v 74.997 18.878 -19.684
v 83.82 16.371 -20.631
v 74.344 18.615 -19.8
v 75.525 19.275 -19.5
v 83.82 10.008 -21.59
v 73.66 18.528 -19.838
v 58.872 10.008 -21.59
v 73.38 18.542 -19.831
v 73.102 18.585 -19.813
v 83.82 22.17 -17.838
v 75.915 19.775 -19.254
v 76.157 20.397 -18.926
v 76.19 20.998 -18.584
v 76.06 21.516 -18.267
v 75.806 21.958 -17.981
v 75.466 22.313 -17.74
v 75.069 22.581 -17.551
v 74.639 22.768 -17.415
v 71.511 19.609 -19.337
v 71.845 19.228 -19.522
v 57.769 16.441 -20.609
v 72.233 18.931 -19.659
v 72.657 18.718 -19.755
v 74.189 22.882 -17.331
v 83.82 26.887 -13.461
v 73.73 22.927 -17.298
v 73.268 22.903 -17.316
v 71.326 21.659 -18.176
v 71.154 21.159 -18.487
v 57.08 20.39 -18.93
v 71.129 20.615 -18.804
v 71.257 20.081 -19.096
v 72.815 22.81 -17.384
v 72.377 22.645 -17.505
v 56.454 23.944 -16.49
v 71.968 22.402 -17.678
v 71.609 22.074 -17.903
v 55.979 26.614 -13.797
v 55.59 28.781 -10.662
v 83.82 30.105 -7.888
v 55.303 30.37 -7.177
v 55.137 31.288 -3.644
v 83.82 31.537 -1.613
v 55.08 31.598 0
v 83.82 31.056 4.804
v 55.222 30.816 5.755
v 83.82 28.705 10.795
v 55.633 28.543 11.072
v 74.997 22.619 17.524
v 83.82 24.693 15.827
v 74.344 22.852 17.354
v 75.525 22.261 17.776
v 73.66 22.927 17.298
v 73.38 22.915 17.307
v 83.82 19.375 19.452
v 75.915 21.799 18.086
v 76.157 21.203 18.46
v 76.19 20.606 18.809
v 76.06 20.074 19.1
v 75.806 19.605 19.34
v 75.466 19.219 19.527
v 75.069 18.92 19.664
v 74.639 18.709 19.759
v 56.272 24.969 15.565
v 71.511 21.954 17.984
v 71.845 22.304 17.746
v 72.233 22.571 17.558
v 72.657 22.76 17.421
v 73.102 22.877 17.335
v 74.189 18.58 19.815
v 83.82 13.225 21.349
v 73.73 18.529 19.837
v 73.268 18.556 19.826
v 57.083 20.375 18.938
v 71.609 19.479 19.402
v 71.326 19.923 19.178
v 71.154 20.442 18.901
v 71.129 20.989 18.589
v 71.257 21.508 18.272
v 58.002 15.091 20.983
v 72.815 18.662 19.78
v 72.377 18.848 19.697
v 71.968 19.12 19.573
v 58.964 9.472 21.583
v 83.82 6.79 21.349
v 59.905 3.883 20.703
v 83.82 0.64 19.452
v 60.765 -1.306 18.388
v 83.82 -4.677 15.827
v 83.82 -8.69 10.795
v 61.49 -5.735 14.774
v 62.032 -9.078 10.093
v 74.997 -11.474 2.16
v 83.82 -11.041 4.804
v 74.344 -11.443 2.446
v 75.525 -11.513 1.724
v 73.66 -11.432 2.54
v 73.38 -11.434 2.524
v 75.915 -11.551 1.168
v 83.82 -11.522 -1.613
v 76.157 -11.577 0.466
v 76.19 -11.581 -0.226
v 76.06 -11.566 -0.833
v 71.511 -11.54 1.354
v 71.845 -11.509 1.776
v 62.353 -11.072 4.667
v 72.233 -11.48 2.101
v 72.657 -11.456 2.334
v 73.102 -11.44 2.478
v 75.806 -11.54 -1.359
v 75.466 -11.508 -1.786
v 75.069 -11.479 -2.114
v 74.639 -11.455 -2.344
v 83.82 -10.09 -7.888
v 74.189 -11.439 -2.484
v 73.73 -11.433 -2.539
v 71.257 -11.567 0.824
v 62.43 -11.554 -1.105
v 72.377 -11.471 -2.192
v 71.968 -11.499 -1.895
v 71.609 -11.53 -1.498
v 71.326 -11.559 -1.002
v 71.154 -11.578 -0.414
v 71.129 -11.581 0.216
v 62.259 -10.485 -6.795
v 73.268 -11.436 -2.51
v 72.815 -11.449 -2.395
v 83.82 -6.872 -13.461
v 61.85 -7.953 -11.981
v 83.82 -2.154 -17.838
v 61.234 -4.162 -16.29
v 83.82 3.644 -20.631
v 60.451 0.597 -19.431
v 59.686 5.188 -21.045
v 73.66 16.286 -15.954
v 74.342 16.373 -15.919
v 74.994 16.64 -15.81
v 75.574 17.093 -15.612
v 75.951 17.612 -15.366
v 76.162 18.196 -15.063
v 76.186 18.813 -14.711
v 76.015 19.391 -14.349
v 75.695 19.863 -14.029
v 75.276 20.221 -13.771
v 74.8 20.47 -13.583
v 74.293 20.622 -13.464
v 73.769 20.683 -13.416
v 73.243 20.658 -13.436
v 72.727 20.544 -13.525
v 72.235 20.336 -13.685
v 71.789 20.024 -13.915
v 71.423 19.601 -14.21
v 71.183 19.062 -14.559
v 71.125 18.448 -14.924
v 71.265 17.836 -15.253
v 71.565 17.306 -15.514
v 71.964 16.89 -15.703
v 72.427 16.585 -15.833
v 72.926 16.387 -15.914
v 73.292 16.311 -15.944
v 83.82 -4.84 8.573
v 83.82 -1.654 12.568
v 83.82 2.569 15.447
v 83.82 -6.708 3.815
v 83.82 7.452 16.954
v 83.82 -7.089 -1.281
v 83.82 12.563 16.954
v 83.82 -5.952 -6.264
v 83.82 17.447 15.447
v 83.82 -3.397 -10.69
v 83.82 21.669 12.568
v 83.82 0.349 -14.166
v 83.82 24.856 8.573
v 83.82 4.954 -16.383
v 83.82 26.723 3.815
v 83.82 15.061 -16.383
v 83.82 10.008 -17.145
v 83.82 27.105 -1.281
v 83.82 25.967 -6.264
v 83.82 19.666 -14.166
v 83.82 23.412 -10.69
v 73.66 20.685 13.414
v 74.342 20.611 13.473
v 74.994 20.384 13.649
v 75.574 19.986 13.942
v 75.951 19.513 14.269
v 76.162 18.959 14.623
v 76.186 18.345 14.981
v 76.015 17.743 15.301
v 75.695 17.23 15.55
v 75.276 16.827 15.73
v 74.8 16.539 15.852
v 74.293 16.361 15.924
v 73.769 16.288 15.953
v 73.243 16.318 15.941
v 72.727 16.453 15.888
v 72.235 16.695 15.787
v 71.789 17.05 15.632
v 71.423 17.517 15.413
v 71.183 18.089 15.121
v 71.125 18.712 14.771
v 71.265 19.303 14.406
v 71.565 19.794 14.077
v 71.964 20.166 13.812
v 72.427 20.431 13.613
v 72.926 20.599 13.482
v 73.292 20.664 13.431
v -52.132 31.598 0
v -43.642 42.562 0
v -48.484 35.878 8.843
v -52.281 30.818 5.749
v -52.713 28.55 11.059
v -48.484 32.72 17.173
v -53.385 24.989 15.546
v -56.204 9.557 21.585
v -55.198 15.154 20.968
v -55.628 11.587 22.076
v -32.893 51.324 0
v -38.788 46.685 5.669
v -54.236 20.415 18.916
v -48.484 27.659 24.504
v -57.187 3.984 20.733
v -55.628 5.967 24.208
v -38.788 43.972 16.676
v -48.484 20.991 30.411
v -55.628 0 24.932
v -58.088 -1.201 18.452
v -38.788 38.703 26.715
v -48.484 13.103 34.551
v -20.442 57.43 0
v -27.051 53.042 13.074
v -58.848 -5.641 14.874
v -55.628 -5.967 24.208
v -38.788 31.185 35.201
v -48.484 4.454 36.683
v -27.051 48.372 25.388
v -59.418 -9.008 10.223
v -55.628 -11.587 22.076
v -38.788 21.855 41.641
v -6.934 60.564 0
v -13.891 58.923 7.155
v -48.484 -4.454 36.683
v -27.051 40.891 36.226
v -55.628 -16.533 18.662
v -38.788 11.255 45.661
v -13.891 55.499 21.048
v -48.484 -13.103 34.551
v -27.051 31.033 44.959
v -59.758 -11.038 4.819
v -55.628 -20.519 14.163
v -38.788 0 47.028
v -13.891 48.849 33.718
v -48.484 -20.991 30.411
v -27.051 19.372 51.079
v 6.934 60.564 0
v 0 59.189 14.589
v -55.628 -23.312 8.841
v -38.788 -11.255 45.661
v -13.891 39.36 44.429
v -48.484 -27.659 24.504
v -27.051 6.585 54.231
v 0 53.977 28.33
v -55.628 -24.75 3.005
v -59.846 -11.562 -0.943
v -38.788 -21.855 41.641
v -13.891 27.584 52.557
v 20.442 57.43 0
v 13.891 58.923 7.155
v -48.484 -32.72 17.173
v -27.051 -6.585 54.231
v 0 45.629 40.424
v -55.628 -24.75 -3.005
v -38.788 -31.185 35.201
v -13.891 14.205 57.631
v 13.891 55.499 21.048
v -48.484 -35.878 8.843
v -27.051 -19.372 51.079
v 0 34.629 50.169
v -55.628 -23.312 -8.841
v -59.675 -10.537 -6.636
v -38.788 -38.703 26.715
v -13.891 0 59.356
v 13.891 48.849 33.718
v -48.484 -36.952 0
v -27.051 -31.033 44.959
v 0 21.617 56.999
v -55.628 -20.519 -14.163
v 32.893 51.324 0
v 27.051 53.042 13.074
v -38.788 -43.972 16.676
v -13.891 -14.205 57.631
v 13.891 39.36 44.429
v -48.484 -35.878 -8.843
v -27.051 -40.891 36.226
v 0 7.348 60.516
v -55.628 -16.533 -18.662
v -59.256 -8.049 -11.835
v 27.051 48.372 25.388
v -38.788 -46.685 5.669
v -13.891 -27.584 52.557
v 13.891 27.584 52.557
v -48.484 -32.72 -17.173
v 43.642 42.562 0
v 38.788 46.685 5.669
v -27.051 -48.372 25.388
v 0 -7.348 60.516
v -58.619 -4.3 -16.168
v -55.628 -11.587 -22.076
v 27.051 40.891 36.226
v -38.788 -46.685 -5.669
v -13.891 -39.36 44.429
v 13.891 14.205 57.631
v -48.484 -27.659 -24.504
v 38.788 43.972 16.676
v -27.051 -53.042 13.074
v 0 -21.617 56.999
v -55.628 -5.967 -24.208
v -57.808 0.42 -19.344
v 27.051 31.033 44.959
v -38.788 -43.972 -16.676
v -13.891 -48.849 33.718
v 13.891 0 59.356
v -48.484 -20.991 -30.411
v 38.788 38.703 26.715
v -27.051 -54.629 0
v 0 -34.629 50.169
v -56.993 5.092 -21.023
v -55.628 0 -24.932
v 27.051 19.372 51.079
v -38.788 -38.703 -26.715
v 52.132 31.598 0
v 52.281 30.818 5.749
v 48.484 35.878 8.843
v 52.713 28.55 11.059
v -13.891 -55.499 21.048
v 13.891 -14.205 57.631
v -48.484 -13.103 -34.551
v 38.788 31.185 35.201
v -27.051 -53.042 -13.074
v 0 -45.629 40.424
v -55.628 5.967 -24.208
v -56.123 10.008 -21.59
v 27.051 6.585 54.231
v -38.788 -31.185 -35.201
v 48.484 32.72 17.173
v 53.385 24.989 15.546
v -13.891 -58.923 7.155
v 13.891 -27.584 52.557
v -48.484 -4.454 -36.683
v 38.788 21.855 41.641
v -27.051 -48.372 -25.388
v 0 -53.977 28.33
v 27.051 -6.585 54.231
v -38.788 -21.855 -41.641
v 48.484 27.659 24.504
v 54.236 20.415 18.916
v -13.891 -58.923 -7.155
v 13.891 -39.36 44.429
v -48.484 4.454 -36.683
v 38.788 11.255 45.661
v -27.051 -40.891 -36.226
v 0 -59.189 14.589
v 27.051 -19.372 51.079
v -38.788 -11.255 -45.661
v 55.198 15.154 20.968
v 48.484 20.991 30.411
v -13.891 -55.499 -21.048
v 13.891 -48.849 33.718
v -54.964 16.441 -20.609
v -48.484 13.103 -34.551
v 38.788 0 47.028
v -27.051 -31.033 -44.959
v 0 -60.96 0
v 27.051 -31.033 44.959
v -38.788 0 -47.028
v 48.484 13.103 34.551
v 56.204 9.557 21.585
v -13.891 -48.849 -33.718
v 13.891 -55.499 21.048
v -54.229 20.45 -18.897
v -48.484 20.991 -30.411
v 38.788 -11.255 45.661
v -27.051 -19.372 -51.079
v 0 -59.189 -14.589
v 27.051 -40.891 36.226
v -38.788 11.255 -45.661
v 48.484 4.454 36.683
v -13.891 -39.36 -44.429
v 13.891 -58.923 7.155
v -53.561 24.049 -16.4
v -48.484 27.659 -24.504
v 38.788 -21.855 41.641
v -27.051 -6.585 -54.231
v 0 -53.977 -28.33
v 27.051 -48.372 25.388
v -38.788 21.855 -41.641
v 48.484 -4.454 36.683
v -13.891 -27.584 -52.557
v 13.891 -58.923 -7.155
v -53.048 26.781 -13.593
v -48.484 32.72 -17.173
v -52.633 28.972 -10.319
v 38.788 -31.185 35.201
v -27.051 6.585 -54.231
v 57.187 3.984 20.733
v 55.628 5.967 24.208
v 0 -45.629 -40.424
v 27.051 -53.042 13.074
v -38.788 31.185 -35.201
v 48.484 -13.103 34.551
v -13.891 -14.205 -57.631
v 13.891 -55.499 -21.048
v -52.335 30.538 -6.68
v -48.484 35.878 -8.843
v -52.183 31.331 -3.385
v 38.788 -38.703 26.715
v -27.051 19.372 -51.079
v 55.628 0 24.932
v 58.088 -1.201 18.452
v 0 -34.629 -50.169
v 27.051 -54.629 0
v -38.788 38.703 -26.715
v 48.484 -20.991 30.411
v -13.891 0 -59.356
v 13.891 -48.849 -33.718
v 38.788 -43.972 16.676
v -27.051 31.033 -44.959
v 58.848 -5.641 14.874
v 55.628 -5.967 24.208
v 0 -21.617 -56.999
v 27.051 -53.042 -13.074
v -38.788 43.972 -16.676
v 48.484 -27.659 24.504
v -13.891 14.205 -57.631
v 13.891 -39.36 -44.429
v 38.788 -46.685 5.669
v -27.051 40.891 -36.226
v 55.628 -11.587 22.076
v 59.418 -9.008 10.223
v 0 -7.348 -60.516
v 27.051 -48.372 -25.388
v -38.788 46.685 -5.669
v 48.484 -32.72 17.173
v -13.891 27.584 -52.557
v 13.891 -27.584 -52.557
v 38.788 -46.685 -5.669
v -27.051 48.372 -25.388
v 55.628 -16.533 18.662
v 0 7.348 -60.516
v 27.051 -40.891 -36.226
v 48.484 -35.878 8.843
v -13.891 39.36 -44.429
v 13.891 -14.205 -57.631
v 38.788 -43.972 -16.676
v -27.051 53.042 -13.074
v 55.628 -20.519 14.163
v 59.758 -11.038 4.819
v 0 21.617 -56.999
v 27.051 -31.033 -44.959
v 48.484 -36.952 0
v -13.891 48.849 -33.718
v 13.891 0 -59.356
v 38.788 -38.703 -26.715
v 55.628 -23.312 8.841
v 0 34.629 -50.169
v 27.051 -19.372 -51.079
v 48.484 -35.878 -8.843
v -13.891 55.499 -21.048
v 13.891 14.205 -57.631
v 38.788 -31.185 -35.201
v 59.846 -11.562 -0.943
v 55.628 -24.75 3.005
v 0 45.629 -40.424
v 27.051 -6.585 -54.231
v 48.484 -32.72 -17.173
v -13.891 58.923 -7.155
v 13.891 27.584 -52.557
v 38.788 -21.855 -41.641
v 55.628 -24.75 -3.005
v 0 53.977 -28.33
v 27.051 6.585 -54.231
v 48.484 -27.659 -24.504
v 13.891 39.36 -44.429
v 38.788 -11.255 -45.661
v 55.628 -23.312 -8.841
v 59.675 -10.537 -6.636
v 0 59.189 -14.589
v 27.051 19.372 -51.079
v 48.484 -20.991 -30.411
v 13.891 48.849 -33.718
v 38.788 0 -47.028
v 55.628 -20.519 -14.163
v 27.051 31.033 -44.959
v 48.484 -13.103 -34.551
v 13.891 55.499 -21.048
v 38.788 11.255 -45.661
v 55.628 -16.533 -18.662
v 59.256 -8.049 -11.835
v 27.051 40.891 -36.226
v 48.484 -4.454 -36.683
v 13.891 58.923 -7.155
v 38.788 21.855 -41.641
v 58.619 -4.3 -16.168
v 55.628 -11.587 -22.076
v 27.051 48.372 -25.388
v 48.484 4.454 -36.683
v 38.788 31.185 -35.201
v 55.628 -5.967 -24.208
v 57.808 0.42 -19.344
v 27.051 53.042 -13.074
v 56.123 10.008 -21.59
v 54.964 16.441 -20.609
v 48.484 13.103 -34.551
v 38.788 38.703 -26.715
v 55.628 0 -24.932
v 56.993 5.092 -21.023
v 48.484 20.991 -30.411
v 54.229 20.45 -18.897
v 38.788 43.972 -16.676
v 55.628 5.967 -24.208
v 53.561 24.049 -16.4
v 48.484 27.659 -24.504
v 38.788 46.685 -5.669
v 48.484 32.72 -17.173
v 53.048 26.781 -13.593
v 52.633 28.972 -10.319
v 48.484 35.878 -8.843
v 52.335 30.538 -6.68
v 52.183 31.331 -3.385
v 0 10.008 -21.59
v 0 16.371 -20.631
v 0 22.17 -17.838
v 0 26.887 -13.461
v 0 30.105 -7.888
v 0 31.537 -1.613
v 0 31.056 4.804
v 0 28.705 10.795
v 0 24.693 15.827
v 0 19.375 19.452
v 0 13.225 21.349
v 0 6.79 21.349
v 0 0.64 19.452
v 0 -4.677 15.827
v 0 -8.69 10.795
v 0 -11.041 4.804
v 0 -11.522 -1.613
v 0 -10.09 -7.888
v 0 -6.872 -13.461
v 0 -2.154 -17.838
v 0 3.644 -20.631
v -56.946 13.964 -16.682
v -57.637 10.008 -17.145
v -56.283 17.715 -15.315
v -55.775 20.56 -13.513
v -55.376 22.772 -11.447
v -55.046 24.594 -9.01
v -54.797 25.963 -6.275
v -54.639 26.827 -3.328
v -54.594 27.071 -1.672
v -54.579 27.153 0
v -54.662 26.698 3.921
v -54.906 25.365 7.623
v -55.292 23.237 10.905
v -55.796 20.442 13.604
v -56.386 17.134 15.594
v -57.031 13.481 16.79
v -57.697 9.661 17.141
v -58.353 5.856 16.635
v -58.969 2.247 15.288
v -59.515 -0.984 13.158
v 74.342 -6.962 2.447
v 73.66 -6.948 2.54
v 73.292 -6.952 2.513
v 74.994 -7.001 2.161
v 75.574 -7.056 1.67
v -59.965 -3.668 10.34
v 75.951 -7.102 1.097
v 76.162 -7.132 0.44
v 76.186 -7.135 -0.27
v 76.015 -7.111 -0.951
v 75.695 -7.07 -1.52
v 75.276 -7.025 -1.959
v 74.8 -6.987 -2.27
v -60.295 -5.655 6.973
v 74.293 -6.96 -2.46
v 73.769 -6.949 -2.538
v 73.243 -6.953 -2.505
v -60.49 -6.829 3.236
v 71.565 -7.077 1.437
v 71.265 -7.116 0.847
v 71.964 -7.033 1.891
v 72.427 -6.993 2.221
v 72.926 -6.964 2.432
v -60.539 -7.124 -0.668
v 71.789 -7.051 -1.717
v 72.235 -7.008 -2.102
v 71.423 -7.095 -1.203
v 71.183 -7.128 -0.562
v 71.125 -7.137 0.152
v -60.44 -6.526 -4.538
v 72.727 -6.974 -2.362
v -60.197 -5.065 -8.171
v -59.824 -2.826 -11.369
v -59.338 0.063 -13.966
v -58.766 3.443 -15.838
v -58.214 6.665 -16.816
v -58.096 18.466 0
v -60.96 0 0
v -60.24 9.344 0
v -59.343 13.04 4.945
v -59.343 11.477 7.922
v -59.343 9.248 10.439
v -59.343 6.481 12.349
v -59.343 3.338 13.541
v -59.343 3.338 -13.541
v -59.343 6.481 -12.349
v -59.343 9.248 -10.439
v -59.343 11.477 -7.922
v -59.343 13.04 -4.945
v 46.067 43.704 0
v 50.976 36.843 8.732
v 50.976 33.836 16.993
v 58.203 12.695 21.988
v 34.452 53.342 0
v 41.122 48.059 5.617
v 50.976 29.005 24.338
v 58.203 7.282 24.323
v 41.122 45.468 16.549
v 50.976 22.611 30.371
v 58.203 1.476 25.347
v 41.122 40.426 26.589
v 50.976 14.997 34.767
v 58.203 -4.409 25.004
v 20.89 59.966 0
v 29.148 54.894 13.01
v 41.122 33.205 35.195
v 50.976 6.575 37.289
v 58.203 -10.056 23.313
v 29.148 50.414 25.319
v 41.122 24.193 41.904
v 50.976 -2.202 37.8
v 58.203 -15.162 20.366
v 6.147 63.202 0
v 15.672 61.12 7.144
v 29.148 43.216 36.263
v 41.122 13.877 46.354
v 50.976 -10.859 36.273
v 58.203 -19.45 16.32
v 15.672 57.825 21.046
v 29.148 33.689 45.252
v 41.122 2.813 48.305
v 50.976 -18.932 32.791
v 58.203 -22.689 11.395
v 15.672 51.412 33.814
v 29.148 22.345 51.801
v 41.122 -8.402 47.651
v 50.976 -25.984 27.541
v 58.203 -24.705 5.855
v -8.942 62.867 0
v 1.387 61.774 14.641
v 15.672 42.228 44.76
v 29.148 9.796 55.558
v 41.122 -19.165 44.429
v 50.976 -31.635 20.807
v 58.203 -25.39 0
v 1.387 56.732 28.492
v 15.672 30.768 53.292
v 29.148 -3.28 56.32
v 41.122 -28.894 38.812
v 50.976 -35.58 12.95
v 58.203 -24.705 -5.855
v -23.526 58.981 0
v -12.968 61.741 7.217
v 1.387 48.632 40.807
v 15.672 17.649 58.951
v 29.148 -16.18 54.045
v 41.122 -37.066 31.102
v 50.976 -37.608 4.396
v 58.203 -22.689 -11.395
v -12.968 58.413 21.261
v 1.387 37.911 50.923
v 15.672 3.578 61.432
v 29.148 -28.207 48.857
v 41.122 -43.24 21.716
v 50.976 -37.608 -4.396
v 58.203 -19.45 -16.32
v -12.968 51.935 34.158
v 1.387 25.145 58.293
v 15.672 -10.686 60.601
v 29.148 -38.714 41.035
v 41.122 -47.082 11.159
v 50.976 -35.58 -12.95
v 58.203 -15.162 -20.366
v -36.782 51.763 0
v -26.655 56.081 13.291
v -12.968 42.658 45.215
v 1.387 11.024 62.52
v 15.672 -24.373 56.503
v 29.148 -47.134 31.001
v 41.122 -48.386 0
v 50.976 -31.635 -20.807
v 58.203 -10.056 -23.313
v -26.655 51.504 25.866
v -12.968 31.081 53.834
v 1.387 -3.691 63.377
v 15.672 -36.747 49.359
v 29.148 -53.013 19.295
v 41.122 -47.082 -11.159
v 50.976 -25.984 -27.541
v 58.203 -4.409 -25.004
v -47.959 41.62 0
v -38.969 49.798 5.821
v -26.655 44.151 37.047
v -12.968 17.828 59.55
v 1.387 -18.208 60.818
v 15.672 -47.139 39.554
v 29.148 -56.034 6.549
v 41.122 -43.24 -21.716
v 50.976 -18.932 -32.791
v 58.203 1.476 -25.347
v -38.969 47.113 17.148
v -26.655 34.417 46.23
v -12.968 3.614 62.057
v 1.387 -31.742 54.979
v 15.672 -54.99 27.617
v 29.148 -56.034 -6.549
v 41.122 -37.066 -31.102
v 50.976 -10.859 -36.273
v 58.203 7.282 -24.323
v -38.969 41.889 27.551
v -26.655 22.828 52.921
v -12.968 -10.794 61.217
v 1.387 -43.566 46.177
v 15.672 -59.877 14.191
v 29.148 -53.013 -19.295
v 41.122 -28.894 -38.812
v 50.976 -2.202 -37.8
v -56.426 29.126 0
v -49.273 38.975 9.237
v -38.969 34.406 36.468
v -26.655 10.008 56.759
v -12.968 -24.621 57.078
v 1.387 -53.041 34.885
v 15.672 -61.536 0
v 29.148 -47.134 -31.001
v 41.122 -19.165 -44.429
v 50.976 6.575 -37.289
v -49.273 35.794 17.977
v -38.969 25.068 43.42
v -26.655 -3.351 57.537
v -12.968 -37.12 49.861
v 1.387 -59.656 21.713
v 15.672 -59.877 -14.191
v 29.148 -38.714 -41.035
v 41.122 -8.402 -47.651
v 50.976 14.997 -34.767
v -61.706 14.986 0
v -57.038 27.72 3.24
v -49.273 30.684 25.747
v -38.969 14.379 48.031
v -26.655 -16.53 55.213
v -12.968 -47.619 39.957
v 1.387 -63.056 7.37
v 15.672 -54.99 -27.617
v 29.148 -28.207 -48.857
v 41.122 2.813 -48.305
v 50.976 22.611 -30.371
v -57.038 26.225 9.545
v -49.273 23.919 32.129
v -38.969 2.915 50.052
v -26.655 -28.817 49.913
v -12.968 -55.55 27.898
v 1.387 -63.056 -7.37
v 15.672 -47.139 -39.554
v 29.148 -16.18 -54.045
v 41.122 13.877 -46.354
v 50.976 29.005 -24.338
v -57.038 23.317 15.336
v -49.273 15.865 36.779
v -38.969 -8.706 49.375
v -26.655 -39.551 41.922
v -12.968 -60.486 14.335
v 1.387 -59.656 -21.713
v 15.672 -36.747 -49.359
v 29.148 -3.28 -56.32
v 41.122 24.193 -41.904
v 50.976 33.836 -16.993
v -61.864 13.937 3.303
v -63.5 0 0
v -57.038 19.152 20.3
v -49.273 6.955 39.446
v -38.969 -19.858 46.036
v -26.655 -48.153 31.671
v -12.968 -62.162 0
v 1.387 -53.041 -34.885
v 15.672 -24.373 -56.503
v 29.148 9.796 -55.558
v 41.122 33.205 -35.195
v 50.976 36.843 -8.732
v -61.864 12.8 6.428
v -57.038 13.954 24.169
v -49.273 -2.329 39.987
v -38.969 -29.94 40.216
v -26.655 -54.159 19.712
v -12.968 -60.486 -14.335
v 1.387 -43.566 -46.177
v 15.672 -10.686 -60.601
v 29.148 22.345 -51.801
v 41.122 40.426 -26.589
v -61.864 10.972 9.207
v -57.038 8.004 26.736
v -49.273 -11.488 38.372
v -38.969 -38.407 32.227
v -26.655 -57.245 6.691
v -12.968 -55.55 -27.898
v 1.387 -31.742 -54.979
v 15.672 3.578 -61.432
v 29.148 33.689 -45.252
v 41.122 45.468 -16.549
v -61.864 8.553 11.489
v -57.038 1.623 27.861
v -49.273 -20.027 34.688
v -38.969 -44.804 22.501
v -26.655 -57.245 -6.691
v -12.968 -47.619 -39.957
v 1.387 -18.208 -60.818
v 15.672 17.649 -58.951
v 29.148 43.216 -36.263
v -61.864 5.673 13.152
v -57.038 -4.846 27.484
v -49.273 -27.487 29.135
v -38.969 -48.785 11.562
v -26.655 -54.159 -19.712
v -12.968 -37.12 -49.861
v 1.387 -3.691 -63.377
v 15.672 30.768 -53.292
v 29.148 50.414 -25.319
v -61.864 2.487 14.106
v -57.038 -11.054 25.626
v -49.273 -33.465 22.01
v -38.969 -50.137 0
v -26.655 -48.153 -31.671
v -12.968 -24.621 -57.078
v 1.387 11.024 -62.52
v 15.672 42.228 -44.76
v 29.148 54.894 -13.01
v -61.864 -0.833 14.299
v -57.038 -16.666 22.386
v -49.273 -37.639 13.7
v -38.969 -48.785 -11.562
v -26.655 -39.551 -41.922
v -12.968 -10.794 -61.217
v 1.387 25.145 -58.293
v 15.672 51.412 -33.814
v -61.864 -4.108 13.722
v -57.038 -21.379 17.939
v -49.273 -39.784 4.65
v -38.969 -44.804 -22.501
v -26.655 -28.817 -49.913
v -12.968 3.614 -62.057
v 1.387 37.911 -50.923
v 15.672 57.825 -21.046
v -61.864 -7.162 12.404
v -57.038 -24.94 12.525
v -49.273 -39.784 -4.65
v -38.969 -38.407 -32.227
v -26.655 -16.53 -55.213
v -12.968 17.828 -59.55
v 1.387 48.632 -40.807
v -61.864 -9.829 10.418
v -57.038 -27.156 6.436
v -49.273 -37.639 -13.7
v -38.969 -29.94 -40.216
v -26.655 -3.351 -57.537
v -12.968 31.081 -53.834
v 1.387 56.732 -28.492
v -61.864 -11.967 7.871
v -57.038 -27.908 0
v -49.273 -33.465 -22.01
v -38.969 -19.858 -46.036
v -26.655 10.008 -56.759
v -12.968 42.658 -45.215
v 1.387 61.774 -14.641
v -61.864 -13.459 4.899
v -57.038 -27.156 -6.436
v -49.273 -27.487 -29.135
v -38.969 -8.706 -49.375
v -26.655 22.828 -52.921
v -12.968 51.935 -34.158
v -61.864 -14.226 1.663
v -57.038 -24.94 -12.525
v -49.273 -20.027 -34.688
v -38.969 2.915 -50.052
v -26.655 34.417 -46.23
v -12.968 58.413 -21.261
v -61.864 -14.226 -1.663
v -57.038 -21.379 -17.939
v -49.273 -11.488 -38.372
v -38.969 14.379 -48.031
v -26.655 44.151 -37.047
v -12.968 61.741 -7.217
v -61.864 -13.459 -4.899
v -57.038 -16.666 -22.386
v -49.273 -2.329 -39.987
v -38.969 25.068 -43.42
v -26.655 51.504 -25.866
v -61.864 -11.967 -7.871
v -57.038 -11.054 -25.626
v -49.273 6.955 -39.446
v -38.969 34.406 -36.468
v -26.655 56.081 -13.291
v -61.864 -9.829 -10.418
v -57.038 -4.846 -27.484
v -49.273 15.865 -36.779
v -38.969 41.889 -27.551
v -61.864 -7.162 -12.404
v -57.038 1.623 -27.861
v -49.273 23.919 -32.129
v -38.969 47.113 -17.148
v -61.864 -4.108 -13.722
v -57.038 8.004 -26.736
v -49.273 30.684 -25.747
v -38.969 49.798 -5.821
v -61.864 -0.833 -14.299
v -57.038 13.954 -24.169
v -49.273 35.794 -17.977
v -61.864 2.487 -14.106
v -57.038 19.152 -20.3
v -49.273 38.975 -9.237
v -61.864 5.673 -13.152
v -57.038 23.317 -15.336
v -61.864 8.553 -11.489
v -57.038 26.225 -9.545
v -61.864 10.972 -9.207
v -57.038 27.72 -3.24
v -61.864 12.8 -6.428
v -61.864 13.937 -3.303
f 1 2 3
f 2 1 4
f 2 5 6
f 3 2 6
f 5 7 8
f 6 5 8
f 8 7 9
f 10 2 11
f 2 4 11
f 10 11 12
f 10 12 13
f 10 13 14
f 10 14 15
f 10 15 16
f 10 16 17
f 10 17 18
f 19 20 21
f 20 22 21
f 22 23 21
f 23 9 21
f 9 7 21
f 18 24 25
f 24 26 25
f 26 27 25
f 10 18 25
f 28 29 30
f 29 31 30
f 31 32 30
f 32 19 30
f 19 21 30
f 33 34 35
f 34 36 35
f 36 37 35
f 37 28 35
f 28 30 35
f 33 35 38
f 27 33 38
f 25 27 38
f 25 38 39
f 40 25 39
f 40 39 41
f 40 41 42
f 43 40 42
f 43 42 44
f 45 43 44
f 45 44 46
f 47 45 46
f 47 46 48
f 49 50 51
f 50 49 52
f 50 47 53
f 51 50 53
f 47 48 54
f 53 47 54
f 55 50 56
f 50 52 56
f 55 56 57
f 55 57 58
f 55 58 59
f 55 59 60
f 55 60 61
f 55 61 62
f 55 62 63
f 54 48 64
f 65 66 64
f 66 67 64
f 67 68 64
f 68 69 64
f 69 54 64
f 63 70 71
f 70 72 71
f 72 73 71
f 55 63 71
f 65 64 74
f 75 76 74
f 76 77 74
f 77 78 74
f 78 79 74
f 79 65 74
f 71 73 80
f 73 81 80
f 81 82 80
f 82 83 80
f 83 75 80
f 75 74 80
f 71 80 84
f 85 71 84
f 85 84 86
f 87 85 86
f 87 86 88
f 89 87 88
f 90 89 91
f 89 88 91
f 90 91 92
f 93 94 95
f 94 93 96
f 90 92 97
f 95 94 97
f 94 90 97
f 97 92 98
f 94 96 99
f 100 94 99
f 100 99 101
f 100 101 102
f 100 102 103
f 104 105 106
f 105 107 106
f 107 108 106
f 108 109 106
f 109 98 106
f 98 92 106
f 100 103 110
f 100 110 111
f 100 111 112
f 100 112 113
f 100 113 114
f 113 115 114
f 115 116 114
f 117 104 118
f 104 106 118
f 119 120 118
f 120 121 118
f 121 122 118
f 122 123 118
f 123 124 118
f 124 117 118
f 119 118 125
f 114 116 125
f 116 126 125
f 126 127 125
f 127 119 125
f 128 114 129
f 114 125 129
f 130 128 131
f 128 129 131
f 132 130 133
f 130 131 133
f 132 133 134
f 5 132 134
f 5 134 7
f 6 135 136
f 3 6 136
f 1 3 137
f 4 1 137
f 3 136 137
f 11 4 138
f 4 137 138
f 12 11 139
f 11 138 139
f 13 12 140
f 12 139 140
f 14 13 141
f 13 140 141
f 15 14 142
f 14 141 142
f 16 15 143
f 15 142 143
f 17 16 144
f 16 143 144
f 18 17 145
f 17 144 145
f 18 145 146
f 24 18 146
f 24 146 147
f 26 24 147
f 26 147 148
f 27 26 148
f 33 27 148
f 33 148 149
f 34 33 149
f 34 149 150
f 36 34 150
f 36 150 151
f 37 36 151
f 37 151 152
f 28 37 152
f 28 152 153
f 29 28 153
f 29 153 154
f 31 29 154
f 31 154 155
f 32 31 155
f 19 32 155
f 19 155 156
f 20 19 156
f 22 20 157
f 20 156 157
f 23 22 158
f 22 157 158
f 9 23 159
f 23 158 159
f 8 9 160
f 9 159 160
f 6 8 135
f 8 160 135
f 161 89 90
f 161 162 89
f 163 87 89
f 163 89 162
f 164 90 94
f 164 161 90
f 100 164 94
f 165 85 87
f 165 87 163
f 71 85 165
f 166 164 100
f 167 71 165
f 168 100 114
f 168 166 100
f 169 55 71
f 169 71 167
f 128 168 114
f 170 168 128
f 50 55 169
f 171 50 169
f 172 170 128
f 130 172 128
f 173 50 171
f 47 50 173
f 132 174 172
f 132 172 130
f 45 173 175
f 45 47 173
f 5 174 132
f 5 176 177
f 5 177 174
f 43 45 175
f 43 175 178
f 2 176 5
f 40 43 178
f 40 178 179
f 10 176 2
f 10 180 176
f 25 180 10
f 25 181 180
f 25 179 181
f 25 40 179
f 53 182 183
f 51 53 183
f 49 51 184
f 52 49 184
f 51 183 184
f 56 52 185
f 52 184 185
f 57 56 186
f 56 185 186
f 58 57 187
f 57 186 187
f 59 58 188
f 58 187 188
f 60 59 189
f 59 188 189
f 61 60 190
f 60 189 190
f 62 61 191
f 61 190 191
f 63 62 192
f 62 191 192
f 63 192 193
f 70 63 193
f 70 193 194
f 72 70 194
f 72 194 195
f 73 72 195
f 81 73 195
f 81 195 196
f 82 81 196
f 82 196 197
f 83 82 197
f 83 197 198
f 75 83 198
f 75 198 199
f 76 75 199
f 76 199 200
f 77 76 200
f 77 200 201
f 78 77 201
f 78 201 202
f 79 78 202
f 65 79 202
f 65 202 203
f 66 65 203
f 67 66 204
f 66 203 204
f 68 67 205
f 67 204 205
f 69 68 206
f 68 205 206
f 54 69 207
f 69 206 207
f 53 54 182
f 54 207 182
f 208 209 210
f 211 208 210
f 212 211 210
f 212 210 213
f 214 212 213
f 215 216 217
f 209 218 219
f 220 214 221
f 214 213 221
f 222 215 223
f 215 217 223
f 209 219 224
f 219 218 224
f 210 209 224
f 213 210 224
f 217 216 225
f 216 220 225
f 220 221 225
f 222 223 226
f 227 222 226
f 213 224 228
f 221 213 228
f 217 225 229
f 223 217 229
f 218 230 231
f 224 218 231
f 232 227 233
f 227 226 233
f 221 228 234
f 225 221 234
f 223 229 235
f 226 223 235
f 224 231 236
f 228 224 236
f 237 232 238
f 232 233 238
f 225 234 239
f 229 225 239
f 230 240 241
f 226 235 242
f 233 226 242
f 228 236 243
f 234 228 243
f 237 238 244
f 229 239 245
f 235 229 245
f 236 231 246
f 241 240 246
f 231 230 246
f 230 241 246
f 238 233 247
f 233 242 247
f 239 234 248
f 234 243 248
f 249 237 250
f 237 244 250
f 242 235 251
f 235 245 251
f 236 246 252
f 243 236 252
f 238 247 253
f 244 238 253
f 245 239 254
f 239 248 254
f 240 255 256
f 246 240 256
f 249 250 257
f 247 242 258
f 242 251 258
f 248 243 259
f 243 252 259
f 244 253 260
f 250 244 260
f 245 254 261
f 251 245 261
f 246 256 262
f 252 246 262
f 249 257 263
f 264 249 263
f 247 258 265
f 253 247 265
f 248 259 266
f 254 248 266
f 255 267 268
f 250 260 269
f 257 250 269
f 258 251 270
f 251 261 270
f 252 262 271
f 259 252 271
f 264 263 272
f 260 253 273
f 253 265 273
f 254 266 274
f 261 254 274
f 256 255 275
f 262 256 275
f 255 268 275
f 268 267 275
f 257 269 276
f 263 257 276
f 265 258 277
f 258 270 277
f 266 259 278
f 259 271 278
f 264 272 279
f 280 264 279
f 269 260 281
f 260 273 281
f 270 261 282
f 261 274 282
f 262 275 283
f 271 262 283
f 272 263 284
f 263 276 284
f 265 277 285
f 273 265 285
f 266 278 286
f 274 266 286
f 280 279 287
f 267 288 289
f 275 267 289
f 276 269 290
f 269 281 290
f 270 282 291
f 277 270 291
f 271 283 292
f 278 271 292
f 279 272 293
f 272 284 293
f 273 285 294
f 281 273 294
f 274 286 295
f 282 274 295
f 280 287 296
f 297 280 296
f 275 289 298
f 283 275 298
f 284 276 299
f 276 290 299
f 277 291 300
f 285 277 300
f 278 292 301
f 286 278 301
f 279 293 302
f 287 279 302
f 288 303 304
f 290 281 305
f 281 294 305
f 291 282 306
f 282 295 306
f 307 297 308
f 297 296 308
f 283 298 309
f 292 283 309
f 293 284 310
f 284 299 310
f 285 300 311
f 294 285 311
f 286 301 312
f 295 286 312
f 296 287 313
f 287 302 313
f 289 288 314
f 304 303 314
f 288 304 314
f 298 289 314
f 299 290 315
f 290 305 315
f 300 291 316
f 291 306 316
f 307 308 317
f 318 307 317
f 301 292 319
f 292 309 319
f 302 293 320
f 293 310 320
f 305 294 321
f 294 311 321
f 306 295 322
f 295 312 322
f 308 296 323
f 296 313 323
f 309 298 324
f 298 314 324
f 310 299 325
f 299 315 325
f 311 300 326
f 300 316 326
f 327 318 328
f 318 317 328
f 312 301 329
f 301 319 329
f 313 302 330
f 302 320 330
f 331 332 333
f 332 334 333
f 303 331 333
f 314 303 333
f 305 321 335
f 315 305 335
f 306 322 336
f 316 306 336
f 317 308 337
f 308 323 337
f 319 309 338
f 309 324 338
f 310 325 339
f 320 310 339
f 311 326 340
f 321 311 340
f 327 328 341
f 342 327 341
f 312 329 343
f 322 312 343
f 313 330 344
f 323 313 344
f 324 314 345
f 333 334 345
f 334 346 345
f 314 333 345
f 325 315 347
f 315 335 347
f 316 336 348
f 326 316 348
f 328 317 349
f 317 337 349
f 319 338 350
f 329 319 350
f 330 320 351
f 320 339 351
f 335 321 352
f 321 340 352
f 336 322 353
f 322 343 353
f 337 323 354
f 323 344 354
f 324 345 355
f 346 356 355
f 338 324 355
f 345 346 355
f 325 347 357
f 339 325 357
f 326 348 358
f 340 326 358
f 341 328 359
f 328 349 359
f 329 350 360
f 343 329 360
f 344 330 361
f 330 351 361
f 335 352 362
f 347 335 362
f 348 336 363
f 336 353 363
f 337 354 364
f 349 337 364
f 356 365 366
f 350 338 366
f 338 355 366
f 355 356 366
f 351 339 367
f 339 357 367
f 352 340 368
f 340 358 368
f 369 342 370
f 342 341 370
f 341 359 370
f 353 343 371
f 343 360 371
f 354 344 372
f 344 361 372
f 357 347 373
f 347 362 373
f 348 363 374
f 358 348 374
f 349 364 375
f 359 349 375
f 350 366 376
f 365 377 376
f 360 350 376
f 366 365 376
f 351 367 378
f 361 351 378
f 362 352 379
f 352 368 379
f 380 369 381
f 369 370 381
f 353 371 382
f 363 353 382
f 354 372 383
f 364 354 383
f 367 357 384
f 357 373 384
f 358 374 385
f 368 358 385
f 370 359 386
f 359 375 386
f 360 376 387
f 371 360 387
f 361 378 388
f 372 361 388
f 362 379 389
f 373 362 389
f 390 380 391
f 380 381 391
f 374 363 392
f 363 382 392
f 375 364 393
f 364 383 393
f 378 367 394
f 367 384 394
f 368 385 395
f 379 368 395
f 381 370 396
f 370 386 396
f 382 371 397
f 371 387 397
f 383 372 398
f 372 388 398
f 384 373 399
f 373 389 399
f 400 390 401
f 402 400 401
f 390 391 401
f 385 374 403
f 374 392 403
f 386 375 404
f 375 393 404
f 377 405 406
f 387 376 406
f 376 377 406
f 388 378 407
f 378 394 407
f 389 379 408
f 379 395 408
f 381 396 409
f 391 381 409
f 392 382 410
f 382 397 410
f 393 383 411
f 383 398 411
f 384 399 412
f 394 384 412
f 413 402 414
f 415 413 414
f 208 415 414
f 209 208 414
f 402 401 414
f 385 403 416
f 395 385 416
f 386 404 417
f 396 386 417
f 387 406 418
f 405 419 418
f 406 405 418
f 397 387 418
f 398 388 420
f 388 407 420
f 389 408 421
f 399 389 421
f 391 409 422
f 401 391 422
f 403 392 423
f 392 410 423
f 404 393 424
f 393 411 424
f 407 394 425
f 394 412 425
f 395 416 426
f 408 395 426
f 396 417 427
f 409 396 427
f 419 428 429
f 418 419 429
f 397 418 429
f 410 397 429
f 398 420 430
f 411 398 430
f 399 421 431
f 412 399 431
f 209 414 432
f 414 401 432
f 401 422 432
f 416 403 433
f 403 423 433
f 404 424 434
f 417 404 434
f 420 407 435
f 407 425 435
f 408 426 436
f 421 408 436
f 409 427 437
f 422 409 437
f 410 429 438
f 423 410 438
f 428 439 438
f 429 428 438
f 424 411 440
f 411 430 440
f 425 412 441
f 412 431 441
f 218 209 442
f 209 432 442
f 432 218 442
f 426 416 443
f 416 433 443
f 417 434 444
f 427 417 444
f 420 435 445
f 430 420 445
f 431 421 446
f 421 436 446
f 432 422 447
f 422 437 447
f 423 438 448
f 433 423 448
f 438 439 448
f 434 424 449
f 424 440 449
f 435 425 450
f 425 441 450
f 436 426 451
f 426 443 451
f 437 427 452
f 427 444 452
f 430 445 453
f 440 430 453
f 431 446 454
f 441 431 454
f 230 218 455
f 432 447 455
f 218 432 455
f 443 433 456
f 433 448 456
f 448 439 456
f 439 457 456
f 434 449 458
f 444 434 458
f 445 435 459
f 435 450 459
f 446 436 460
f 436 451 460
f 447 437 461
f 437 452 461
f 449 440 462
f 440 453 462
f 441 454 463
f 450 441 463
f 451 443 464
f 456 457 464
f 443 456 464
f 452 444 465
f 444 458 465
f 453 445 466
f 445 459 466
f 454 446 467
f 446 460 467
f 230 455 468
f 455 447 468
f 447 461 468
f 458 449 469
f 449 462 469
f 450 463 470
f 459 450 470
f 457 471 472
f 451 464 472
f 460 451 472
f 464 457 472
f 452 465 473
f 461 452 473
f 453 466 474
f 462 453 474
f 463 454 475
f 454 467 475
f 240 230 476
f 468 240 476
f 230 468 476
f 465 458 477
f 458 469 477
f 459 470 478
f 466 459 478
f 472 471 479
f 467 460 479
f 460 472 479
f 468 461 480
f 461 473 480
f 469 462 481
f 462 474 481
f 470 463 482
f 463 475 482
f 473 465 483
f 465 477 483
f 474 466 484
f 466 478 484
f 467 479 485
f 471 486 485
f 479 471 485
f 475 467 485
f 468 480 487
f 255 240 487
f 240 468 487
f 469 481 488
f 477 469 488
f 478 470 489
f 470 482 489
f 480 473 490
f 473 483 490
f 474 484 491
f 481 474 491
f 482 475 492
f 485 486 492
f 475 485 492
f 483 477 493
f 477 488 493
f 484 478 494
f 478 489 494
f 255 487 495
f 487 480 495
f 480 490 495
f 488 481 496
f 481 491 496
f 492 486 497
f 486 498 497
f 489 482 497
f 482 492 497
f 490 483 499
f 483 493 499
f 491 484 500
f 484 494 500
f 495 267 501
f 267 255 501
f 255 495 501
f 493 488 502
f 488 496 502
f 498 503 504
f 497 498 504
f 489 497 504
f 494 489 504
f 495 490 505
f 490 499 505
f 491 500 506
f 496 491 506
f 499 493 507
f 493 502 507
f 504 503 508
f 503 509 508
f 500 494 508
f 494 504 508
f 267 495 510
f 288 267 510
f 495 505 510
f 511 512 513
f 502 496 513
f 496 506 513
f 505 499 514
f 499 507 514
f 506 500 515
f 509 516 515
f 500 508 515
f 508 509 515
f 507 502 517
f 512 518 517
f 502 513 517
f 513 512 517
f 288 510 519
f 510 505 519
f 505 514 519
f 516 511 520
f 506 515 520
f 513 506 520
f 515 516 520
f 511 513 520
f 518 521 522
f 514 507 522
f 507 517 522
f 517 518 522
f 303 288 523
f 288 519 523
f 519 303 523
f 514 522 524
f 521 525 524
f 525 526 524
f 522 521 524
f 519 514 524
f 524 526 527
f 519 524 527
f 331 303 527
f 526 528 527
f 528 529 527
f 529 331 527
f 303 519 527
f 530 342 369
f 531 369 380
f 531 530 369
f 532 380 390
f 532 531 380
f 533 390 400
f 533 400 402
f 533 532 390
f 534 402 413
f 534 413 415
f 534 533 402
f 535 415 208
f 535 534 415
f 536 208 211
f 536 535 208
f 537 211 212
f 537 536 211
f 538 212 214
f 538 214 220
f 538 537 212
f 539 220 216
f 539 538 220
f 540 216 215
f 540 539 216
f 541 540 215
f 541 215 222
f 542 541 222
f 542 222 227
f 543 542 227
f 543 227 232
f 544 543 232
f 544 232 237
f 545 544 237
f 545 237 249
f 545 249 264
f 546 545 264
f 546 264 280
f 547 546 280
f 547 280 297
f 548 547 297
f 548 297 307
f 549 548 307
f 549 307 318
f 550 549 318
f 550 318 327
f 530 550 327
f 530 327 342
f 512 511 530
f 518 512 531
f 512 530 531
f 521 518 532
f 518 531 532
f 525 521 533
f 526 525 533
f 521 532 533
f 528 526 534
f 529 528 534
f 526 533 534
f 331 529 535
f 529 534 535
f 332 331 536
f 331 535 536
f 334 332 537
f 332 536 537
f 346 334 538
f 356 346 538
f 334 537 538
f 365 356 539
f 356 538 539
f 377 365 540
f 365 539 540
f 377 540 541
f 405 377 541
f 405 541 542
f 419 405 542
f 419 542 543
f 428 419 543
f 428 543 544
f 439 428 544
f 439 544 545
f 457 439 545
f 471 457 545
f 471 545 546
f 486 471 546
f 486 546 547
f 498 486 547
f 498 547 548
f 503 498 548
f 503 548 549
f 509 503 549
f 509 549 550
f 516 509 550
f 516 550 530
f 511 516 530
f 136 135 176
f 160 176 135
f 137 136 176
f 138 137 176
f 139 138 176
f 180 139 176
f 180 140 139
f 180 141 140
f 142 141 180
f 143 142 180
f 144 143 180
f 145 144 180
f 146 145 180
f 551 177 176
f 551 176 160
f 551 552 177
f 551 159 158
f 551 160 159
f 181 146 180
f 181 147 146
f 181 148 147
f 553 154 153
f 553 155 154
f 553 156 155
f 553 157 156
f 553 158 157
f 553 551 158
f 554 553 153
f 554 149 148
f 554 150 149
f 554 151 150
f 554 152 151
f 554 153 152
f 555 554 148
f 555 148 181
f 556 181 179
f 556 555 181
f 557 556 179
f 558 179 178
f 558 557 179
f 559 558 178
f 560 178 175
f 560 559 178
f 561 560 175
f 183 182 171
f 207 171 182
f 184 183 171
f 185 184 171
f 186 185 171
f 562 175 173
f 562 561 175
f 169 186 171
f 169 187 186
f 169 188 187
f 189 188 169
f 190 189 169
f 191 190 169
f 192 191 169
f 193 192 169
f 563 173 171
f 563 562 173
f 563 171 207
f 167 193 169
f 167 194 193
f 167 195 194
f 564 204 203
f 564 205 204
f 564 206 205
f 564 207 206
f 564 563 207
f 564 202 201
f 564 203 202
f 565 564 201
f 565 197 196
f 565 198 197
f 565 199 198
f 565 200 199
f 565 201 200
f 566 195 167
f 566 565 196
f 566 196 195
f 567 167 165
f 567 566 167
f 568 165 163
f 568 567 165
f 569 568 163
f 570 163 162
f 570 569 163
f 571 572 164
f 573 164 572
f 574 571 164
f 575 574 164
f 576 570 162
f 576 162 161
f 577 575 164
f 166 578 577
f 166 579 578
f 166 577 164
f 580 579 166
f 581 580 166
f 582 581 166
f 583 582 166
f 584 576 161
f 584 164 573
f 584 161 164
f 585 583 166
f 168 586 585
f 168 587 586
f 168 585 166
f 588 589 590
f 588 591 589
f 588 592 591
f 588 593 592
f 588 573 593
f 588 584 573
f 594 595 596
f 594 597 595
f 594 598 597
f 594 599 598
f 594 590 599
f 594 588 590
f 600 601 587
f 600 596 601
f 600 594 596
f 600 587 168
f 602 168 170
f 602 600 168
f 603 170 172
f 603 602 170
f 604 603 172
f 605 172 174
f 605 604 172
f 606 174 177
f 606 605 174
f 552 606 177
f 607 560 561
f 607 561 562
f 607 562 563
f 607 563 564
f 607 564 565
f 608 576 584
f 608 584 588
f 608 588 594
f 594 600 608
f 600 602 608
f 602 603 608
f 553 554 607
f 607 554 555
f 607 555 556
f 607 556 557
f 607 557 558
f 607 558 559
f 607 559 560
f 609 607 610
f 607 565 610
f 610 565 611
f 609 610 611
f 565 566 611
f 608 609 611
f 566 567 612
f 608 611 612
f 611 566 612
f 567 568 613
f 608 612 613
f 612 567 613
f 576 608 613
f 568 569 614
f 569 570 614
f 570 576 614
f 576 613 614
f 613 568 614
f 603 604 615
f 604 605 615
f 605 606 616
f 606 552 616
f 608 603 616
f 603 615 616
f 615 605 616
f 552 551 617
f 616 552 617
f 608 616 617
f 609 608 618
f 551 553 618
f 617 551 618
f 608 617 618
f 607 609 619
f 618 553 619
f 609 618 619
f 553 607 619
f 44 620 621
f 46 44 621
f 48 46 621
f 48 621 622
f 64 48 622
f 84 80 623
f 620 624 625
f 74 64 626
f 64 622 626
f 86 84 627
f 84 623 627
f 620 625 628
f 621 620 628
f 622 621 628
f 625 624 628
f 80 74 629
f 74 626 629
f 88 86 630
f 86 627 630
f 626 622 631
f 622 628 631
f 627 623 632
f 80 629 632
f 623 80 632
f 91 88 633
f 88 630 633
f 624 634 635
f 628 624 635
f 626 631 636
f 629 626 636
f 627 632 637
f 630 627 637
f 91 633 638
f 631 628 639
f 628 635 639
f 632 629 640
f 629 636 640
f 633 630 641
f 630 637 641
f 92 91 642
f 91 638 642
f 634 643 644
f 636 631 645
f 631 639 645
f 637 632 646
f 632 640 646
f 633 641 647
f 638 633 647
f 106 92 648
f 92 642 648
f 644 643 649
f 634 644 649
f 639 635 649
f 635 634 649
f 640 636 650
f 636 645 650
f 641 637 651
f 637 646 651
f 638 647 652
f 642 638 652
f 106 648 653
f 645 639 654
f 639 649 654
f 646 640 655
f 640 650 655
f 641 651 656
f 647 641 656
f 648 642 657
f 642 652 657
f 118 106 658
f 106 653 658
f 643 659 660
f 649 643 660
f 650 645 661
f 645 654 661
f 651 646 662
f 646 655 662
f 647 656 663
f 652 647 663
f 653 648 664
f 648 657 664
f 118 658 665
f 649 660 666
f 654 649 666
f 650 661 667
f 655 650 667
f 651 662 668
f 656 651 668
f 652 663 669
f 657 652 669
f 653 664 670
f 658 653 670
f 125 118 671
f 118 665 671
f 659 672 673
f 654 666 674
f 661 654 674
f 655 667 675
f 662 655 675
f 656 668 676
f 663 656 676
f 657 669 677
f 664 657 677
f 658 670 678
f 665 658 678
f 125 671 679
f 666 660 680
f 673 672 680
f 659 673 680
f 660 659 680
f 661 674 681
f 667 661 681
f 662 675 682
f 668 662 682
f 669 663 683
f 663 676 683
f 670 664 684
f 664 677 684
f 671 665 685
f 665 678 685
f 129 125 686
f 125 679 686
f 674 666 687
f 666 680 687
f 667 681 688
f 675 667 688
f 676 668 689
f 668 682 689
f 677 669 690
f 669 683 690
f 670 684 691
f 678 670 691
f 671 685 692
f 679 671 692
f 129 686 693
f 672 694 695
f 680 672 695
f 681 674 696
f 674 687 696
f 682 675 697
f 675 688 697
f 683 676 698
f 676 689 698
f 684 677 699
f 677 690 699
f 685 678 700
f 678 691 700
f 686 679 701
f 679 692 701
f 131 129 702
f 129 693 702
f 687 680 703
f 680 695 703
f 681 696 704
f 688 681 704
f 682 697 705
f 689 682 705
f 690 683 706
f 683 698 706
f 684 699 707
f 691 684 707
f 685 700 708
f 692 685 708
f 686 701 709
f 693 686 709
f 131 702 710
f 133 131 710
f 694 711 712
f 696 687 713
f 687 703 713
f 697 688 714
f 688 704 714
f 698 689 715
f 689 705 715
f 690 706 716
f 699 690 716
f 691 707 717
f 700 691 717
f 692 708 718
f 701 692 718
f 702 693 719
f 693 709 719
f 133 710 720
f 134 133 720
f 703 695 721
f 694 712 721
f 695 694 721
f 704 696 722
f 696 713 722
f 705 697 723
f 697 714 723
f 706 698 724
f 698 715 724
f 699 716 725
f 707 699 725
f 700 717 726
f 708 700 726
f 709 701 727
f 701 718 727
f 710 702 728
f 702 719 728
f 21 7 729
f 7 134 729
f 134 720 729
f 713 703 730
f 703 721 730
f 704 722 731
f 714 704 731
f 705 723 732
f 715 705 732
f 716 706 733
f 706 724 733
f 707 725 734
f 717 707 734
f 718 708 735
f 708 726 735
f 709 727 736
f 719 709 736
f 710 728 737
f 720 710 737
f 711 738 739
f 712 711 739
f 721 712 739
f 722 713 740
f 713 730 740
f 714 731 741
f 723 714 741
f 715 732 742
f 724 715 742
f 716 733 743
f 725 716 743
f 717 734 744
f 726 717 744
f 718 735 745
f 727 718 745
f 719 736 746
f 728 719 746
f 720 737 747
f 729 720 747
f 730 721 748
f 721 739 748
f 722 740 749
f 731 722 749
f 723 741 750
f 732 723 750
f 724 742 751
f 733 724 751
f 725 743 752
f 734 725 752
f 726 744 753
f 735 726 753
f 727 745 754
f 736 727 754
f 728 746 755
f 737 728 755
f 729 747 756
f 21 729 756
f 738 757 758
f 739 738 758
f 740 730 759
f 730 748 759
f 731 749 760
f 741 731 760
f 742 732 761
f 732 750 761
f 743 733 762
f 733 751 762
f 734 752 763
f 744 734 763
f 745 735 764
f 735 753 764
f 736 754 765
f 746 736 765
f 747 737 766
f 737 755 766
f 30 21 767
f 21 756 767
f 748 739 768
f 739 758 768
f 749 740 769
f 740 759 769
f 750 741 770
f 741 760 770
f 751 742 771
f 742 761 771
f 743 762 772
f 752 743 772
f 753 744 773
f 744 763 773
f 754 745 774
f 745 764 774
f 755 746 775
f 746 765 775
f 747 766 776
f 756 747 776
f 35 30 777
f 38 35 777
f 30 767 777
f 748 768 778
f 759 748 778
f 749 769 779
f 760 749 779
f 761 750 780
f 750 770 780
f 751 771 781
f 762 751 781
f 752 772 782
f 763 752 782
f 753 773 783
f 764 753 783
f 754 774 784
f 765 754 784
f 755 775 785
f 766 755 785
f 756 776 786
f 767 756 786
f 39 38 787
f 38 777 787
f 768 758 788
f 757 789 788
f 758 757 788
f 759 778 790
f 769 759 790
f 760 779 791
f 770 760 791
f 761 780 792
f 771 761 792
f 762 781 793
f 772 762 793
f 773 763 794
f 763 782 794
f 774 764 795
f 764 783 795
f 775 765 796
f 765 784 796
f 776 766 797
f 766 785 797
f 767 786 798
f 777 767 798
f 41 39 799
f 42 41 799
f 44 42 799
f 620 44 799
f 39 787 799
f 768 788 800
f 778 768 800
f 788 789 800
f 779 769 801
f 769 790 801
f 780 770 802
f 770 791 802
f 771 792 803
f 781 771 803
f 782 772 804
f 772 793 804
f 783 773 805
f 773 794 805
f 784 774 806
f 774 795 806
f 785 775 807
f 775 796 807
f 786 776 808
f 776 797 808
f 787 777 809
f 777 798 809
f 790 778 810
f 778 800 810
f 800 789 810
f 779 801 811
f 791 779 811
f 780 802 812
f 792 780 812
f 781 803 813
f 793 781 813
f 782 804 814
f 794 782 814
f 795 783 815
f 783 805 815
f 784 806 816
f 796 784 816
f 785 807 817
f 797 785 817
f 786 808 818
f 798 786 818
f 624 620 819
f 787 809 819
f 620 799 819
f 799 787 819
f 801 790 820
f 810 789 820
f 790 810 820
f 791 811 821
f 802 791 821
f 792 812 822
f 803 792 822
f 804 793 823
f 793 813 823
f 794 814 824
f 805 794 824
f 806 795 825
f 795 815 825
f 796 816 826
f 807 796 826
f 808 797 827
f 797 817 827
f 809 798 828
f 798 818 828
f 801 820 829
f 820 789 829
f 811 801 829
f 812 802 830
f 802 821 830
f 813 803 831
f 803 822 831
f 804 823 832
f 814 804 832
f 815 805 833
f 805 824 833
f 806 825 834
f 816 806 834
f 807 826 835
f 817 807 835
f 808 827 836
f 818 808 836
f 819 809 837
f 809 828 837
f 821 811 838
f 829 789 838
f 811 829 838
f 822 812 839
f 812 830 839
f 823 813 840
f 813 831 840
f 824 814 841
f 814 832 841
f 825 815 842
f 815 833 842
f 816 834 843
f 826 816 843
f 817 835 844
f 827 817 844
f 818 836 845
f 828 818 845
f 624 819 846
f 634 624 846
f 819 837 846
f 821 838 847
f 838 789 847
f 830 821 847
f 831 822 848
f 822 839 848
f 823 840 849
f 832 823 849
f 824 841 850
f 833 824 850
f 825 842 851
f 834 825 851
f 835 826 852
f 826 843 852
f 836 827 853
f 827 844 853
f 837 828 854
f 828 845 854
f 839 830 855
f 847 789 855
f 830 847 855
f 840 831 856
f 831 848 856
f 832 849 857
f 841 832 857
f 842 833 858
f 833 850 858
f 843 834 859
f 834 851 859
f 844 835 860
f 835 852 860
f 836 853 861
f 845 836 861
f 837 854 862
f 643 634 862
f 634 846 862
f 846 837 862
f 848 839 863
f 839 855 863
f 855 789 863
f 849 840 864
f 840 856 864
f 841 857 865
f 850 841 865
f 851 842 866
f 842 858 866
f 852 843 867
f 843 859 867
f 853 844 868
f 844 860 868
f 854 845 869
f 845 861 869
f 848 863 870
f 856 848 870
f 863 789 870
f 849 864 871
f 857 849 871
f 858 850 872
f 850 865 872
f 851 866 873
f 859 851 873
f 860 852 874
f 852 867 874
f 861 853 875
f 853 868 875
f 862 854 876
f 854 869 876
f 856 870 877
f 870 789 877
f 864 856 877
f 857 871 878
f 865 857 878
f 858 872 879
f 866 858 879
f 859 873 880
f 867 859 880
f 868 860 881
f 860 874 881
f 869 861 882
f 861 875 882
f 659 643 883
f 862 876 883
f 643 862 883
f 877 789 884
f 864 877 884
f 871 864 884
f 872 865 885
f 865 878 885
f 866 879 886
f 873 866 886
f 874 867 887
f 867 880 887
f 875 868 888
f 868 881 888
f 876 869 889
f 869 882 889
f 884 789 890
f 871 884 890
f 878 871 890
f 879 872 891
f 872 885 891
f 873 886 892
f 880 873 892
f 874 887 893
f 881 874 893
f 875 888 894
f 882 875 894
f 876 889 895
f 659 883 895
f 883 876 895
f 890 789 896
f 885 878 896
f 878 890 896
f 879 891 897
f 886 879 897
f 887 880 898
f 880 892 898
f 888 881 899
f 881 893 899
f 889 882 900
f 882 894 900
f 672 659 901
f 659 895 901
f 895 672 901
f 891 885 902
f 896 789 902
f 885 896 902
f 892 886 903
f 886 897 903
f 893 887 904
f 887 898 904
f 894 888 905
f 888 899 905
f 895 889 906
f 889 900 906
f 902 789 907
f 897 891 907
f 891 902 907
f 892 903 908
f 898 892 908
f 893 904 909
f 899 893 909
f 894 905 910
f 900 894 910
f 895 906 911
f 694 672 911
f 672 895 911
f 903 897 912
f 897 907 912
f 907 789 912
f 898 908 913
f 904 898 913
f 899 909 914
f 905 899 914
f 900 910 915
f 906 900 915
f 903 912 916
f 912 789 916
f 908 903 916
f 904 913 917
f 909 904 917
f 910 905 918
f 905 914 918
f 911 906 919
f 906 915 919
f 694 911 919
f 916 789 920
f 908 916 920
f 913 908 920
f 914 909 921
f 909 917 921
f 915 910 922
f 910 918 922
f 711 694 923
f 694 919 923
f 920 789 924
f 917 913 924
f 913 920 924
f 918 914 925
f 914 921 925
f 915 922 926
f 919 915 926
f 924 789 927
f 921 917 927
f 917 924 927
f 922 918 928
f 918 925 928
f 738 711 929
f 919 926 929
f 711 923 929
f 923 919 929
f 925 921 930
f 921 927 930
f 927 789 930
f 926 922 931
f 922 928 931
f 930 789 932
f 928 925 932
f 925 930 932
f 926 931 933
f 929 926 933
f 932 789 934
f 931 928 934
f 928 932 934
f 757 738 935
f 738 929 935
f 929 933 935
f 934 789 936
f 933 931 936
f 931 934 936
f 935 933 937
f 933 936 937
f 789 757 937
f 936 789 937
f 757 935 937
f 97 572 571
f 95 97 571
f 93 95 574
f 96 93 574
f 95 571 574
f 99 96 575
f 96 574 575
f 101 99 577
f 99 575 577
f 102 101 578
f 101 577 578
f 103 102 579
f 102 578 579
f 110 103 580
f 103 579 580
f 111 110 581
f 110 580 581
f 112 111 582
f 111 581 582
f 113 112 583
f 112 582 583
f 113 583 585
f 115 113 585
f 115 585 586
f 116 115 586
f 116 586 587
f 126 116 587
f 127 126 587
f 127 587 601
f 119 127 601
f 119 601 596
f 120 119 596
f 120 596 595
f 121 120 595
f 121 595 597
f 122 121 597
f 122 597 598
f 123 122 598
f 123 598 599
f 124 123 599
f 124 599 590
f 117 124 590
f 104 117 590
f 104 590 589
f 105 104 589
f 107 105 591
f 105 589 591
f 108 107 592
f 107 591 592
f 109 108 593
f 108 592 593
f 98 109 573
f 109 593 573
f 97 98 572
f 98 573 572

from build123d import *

# Parameters (mm, degrees)
SKETCH2_R                       = 21.59
SKETCH2_R_2                     = 17.145
BOSS_EXTRUDE1_DEPTH             = 83.82
BOSS_EXTRUDE1_DIRECTION_2_REACH = 111.985
SKETCH2_4_R                     = 17.145
CUT_EXTRUDE3_DEPTH              = 138.938
SKETCH4_R                       = 2.54
CUT_EXTRUDE4_DEPTH              = 138.938
CIRPATTERN1_COUNT               = 3


with BuildPart() as part:
    # Sketch1 → Revolve1 (revolve)
    with BuildSketch(Plane.XY):
        with BuildLine():
            Line((-63.5, 0), (-60.96, 0))
            ThreePointArc((-60.96, 0), (0, 60.96), (60.96, 0))
            Line((60.96, 0), (63.5, 0))
            ThreePointArc((63.5, 0), (0, 63.5), (-63.5, 0))
        make_face()
    revolve(axis=Axis((-63.5, 0, 0), (1, 0, 0)))

    # Sketch2 → Boss-Extrude1 (add)
    with BuildSketch(Plane(origin=(0, 0, 0), x_dir=(0, 0, -1), z_dir=(1, 0, 0))):
        with Locations((0, 10.0076)):
            Circle(SKETCH2_R)
        with Locations((0, 10.0076)):
            Circle(SKETCH2_R_2, mode=Mode.SUBTRACT)
    extrude(amount=BOSS_EXTRUDE1_DEPTH)

    # Sketch2 → Boss-Extrude1 direction 2 (add, up to next)
    with BuildSketch(Plane(origin=(0, 0, 0), x_dir=(0, 0, -1), z_dir=(1, 0, 0)), mode=Mode.PRIVATE) as boss_extrude1_direction_2_sk1:
        with Locations((0, 10.0076)):
            Circle(SKETCH2_R)
        with Locations((0, 10.0076)):
            Circle(SKETCH2_R_2, mode=Mode.SUBTRACT)
    boss_extrude1_direction_2_tool1 = extrude(boss_extrude1_direction_2_sk1.sketch, amount=-BOSS_EXTRUDE1_DIRECTION_2_REACH, mode=Mode.PRIVATE) - part.part
    add(boss_extrude1_direction_2_tool1.solids().sort_by_distance((0, 10.0076, 20.979343))[0])

    # Sketch2<4> → Cut-Extrude3 (cut)
    with BuildSketch(Plane(origin=(0, 0, 0), x_dir=(0, 0, -1), z_dir=(1, 0, 0))):
        with Locations((0, 10.0076)):
            Circle(SKETCH2_4_R)
    extrude(amount=CUT_EXTRUDE3_DEPTH, mode=Mode.SUBTRACT)

    # Sketch4 → Cut-Extrude4 (cut)
    with BuildSketch(Plane(origin=(0, 0, 0), x_dir=(1, 0, 0), z_dir=(0, 1, 0))):
        with Locations((73.66, 0)):
            Circle(SKETCH4_R)
    cut_extrude4 = extrude(amount=-CUT_EXTRUDE4_DEPTH, mode=Mode.SUBTRACT)

    # CirPattern1: Cut-Extrude4 ×3 about axis
    cirpattern1_axis = Axis((-63.502, 10.0076, 0), (1, 0, 0))
    for i in range(1, CIRPATTERN1_COUNT):
        add(cut_extrude4.rotate(cirpattern1_axis, i * 360 / CIRPATTERN1_COUNT), mode=Mode.SUBTRACT)


solid = part.part
